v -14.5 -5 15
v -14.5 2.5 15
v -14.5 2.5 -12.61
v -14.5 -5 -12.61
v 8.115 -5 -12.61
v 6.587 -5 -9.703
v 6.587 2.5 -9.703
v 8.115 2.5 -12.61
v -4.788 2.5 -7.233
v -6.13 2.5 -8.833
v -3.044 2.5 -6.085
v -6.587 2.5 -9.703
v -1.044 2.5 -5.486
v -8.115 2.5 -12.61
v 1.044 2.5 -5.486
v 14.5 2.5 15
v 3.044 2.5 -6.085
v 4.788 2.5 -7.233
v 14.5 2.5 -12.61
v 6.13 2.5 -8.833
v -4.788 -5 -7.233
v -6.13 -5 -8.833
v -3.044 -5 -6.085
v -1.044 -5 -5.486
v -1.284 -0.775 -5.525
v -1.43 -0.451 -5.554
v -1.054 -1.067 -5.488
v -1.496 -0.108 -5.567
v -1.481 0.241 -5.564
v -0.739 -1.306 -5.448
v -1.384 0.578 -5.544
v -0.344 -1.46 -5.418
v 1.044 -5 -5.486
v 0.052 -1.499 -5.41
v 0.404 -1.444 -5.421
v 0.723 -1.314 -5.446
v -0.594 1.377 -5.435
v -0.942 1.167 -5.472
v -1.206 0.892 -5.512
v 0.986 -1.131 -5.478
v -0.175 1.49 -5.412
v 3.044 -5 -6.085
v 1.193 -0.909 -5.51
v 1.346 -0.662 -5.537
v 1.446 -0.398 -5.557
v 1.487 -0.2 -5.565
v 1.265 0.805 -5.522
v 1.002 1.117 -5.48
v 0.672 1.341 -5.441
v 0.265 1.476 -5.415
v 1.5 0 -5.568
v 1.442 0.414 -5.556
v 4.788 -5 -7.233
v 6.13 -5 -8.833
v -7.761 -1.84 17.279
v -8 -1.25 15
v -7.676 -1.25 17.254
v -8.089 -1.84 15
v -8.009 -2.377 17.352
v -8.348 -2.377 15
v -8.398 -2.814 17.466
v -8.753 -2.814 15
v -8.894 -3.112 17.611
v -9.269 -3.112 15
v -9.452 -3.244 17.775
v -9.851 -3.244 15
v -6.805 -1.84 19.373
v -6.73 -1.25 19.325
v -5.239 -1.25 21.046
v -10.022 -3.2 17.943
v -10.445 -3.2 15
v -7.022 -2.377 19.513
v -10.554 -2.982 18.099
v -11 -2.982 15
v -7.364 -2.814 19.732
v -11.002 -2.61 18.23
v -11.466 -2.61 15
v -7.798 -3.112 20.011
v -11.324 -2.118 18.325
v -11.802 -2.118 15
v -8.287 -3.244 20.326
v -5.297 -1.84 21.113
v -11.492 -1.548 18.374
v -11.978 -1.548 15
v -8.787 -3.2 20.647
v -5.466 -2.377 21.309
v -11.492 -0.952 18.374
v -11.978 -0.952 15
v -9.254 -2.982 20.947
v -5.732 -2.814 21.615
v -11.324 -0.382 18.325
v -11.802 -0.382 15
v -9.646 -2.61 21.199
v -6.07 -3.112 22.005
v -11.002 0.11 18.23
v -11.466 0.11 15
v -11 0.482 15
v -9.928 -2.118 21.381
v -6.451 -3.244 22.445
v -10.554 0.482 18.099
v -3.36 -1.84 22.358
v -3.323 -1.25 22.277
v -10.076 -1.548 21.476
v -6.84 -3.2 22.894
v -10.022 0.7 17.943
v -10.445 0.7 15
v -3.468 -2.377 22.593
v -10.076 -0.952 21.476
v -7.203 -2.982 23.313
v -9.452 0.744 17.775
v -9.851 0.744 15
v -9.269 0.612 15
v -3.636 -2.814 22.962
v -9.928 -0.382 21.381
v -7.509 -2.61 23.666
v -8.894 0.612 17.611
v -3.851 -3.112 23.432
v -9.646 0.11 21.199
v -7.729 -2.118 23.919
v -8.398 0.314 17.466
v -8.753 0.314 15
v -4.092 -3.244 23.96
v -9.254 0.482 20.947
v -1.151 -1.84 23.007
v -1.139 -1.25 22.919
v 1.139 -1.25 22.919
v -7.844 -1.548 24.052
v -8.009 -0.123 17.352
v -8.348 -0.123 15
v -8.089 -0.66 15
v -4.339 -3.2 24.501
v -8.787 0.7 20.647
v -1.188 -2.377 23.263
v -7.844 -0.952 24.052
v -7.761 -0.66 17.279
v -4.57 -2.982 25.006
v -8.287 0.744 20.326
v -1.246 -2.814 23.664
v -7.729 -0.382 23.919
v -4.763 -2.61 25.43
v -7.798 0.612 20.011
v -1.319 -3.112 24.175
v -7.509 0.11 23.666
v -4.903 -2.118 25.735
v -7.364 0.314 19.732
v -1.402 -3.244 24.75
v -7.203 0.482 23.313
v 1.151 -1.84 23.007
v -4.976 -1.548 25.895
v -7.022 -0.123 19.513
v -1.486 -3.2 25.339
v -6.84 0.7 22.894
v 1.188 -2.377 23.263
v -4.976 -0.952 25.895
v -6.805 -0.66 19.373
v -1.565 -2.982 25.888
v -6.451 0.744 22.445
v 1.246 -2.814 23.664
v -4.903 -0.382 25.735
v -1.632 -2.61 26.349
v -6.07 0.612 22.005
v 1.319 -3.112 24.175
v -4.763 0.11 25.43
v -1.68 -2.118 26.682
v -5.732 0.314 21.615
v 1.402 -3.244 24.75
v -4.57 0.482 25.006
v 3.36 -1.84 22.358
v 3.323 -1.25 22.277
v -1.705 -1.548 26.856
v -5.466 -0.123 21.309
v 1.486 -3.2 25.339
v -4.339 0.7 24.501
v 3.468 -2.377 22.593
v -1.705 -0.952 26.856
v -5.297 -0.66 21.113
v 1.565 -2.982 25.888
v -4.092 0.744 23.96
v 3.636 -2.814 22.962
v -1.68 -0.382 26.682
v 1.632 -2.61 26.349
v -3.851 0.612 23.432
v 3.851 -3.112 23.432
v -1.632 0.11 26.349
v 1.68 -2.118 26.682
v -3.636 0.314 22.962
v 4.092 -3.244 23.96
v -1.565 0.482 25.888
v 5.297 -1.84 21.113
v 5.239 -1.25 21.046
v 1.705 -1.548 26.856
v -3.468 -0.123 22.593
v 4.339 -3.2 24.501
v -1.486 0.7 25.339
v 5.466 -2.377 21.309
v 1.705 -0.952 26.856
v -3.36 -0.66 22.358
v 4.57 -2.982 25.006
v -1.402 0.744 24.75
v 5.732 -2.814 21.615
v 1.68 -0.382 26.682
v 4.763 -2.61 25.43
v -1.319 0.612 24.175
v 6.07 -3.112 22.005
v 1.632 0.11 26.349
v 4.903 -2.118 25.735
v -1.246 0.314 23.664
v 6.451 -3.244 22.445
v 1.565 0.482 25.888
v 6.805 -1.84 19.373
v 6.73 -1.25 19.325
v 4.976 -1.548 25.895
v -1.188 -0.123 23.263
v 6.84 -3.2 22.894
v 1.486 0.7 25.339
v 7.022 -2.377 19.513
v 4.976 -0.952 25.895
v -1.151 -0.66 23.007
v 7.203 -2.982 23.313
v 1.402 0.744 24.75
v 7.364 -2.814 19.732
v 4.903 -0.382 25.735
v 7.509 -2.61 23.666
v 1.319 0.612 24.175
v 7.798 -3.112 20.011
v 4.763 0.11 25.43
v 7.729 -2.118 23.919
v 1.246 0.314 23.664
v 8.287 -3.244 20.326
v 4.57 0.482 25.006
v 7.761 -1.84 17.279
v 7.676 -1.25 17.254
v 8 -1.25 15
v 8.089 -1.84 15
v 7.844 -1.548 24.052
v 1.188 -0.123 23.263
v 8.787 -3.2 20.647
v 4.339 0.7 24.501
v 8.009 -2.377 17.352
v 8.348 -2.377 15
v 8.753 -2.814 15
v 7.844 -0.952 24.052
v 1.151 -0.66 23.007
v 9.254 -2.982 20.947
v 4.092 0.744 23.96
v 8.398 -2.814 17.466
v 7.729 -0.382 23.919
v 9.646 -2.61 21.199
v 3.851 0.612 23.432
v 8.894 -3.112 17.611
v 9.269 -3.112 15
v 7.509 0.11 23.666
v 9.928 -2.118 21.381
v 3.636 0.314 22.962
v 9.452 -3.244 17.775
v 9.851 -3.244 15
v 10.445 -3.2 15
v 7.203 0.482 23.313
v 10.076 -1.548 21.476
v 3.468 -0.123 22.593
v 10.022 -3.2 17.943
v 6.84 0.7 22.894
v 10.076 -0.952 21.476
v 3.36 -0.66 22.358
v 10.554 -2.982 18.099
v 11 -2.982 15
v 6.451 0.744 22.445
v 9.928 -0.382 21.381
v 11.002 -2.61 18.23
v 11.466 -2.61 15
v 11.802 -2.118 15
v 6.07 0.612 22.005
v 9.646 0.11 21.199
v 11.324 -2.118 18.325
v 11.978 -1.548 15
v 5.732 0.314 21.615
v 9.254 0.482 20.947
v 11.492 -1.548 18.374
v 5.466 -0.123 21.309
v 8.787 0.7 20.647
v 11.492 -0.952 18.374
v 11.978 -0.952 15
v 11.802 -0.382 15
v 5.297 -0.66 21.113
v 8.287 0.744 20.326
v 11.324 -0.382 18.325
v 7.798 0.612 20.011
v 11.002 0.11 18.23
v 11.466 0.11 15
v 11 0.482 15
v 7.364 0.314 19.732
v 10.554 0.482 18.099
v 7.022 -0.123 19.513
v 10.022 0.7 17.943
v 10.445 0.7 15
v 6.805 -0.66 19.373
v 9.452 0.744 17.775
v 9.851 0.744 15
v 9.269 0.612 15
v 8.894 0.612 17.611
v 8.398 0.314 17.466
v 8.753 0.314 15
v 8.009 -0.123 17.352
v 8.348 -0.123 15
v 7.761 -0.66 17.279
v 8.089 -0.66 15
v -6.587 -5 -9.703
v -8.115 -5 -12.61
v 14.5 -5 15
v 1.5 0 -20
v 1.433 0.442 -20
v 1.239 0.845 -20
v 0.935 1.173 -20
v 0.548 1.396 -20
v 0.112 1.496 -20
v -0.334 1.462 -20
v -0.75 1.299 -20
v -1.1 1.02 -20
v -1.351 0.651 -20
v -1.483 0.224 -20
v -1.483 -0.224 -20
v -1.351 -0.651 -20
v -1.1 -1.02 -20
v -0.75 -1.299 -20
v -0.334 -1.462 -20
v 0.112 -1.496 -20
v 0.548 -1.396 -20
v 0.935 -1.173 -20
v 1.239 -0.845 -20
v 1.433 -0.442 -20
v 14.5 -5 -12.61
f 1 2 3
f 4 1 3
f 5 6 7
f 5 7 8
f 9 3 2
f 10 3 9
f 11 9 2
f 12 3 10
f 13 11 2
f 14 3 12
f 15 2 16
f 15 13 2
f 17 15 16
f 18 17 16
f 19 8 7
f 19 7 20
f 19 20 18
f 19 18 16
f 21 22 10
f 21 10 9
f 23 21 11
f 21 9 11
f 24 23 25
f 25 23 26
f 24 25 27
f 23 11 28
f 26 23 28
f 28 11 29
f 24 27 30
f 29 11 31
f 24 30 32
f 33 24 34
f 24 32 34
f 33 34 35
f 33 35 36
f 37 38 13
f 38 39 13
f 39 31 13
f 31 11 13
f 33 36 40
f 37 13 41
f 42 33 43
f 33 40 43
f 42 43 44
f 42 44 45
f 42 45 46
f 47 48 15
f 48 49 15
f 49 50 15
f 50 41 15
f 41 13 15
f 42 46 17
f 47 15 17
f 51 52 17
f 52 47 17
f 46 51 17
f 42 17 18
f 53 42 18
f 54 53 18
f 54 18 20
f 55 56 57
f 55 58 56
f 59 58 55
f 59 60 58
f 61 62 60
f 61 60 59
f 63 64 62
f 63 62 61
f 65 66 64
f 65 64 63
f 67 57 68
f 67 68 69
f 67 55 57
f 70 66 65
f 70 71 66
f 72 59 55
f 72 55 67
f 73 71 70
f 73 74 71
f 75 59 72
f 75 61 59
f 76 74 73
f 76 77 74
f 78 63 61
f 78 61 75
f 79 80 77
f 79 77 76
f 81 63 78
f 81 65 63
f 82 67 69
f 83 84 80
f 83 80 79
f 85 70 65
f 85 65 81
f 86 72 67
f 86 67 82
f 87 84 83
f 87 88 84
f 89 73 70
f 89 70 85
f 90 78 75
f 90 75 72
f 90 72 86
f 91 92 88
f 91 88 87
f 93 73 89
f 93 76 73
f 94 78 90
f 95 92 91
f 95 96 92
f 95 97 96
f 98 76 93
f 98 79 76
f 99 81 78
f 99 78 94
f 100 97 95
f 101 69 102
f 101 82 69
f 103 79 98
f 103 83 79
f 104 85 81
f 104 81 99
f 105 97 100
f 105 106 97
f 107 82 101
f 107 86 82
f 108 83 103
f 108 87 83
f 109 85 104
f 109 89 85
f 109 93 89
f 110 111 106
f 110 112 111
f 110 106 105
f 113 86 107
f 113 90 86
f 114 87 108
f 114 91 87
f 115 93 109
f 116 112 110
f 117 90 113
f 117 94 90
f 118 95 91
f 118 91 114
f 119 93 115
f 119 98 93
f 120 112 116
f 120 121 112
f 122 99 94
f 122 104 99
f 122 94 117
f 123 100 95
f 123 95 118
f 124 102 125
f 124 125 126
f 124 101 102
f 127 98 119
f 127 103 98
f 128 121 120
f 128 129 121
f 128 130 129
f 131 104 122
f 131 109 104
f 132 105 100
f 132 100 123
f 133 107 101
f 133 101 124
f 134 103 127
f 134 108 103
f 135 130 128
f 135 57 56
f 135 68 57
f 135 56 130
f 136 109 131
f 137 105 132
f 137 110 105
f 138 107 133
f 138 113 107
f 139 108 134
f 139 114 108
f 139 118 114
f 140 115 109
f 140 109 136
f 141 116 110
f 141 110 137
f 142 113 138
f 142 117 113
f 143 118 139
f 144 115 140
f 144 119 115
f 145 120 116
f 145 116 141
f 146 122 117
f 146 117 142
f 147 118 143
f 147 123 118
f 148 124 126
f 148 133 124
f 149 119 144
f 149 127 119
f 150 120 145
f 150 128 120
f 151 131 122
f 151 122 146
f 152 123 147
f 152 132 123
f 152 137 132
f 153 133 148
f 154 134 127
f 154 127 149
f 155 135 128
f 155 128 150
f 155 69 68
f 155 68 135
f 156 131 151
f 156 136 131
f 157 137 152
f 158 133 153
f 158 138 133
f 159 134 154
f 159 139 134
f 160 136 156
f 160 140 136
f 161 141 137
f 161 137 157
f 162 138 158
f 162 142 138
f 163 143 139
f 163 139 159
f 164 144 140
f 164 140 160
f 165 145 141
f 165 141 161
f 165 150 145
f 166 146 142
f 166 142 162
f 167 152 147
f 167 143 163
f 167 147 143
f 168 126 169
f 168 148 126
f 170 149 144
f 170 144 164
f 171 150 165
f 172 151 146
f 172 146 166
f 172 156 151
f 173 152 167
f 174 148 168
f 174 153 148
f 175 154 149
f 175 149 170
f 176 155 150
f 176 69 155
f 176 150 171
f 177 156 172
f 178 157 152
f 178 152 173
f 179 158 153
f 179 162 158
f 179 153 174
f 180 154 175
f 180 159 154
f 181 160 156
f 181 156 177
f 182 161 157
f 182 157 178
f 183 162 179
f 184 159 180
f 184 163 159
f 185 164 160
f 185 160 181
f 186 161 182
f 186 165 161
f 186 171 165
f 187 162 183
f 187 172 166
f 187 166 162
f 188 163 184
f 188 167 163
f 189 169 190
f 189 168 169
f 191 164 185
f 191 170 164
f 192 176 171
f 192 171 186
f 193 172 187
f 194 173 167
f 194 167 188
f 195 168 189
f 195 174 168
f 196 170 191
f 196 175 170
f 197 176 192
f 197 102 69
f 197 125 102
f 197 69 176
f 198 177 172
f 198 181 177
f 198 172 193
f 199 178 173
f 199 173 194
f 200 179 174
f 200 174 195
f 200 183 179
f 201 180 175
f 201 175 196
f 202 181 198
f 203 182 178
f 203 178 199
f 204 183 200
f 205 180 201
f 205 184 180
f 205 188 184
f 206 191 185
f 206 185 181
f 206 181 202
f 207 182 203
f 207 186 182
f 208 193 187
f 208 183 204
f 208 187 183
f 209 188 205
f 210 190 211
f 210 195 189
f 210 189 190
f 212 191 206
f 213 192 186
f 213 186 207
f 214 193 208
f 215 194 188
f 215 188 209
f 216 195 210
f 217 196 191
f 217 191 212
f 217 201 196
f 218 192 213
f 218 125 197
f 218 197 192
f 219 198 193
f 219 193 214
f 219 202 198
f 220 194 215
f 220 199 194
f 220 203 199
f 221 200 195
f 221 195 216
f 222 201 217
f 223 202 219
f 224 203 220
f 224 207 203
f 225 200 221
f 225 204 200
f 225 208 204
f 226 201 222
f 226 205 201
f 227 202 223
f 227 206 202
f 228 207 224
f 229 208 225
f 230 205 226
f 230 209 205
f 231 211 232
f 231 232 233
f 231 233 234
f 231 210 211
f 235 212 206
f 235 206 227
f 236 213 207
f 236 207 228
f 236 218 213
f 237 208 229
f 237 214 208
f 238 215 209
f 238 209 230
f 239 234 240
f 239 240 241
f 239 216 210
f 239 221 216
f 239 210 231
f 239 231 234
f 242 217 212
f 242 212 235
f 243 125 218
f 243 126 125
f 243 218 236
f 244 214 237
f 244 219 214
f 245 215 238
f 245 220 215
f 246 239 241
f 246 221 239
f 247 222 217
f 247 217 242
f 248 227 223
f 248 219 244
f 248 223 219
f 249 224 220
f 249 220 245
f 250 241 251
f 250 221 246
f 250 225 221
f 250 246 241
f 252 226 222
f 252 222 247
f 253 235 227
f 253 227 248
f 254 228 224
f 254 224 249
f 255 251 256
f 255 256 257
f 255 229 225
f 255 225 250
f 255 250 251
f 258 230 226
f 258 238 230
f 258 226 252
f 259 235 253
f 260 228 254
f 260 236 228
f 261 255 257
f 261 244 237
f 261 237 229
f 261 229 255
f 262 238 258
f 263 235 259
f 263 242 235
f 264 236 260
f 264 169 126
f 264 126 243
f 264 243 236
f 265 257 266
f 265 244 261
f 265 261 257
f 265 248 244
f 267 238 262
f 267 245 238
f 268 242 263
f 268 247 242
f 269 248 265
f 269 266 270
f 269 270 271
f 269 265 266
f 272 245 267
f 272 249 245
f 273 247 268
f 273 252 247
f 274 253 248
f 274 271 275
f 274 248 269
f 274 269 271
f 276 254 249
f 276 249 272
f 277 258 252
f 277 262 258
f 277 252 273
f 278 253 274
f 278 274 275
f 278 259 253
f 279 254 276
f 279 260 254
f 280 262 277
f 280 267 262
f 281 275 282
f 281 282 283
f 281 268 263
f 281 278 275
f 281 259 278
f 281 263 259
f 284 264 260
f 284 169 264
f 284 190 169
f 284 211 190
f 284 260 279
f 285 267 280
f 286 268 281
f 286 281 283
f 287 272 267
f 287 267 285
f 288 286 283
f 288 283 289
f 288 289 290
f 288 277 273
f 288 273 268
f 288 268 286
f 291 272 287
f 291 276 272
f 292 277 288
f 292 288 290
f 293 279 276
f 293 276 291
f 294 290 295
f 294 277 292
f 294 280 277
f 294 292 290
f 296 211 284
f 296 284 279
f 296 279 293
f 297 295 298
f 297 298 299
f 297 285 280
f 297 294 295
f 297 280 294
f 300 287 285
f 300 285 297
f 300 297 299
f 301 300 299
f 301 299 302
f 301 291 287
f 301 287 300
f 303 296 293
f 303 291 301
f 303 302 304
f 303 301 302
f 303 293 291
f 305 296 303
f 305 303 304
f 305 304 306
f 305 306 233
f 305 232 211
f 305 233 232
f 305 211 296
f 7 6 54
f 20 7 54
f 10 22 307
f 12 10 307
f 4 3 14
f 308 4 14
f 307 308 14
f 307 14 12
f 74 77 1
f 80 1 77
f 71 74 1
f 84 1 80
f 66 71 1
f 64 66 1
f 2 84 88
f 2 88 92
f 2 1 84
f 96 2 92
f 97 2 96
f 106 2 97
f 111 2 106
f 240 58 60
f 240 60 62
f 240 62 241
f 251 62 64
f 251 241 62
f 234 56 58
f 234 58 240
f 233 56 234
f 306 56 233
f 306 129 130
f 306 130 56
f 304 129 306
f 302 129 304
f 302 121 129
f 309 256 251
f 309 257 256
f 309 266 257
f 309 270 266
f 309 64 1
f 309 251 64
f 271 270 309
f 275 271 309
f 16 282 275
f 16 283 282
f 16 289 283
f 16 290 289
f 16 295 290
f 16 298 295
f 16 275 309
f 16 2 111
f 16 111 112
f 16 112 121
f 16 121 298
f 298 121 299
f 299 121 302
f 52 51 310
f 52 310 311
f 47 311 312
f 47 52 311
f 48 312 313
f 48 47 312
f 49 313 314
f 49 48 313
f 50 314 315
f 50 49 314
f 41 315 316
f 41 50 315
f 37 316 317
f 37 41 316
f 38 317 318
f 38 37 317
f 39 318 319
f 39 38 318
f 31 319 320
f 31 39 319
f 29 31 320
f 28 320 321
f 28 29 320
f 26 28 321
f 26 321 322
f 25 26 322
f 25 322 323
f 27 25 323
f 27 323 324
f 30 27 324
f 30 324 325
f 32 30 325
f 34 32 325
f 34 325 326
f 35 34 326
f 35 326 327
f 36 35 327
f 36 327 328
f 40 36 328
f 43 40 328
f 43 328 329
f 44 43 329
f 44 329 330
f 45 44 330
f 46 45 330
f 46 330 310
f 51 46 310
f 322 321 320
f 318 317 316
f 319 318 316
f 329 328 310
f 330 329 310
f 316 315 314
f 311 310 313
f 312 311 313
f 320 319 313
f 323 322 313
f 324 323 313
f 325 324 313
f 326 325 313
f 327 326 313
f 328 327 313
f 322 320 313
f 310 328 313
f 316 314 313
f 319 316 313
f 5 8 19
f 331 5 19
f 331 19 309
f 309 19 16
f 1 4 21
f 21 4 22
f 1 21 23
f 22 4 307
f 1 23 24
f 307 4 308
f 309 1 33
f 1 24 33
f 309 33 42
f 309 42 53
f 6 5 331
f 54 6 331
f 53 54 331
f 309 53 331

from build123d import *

# Parameters (mm, degrees)
SKETCH1_R           = 1.5
BOSS_EXTRUDE1_DEPTH = 20
BOSS_EXTRUDE2_START = 15
BOSS_EXTRUDE2_DEPTH = 15
SWEEP1_PROFILE_R    = 2
BOSS_EXTRUDE3_DEPTH = 7.5
CHAMFER1_START      = -6
CHAMFER1_DEPTH      = 9
CHAMFER1_START_2    = -5
CHAMFER1_2_DEPTH    = 7.5


with BuildPart() as part:
    # Sketch1 → Boss-Extrude1 (new body)
    with BuildSketch(Plane.XY):
        Circle(SKETCH1_R)
    extrude(amount=-BOSS_EXTRUDE1_DEPTH)

    # Sketch1<3> → Boss-Extrude2 (add)
    with BuildSketch(Plane.XY.offset(BOSS_EXTRUDE2_START)):
        with BuildLine():
            Line((0, 1.5), (0, 2.5))
            Line((0, 2.5), (-14.5, 2.5))
            Line((-14.5, 2.5), (-14.5, -5))
            Line((-14.5, -5), (0, -5))
            Line((0, -5), (0, -1.5))
            ThreePointArc((0, -1.5), (-1.5, 0), (0, 1.5))
        make_face()
        with BuildLine():
            ThreePointArc((1.5, 0), (1.060660172, 1.060660172), (0, 1.5))
            Line((0, 1.5), (0, -1.5))
            ThreePointArc((0, -1.5), (1.060660172, -1.060660172), (1.5, 0))
        make_face()
        with BuildLine():
            Line((0, -1.5), (0, 1.5))
            ThreePointArc((0, 1.5), (-1.5, 0), (0, -1.5))
        make_face()
        with BuildLine():
            Line((14.5, 2.5), (0, 2.5))
            Line((0, 2.5), (0, 1.5))
            ThreePointArc((0, 1.5), (1.060660172, 1.060660172), (1.5, 0))
            ThreePointArc((1.5, 0), (1.060660172, -1.060660172), (0, -1.5))
            Line((0, -1.5), (0, -5))
            Line((0, -5), (14.5, -5))
            Line((14.5, -5), (14.5, 2.5))
        make_face()
    extrude(amount=-BOSS_EXTRUDE2_DEPTH)

    # Sweep1: sweep along a path in Sketch2
    with BuildLine(Plane(origin=(0, -1.25, 0), x_dir=(1, 0, 0), z_dir=(0, 1, 0))) as sweep1_path:
        ThreePointArc((-10, -15), (0, -25), (10, -15))
    # Sweep1 profile (on start of the path) → Sweep1 (sweep)
    with BuildSketch(Plane(origin=(-10, -1.25, 15), x_dir=(1, 0, 0), z_dir=(0, 0, 1))):
        Circle(SWEEP1_PROFILE_R)
    sweep(path=sweep1_path.line)

    # Sketch15 → Boss-Extrude3 (add)
    with BuildSketch(Plane(origin=(0, 2.5, 0), x_dir=(1, 0, 0), z_dir=(0, 1, 0))):
        with BuildLine():
            ThreePointArc((-7.2, 12.61), (0, 5.41), (7.2, 12.61))
            Line((7.2, 12.61), (14.5, 12.61))
            Line((14.5, 12.61), (14.5, 0))
            Line((14.5, 0), (-14.5, 0))
            Line((-14.5, 0), (-14.5, 12.61))
            Line((-14.5, 12.61), (-7.2, 12.61))
        make_face()
    extrude(amount=-BOSS_EXTRUDE3_DEPTH)

    # Chamfer1: read off the stored shape, not the designer's step
    # Chamfer1 outline → Chamfer1 (cut)
    with BuildSketch(Plane(origin=(0, 0, 0), x_dir=(1, 0, 0), z_dir=(0, 1, 0)).offset(CHAMFER1_START)):
        with BuildLine():
            ThreePointArc((7.2, 12.61), (7.04514475, 11.12476081), (6.587240153, 9.7034097))
            Line((6.587240153, 9.7034097), (8.114814982, 12.61))
            Line((8.114814982, 12.61), (7.2, 12.61))
        make_face()
        with BuildLine():
            Line((-8.114814982, 12.61), (-6.587240153, 9.7034097))
            ThreePointArc((-6.587240153, 9.7034097), (-7.04514475, 11.12476081), (-7.2, 12.61))
            Line((-7.2, 12.61), (-8.114814982, 12.61))
        make_face()
    extrude(amount=CHAMFER1_DEPTH, mode=Mode.SUBTRACT)

    # Chamfer1 2 outline → Chamfer1 2 (add)
    with BuildSketch(Plane(origin=(0, 0, 0), x_dir=(1, 0, 0), z_dir=(0, 1, 0)).offset(CHAMFER1_START_2)):
        with BuildLine():
            ThreePointArc((-6.587240153, 9.7034097), (-6.373406906, 9.260420263), (-6.129825647, 8.83306506))
            Line((-6.129825647, 8.83306506), (-6.587240153, 9.7034097))
        make_face()
        with BuildLine():
            Line((6.587240153, 9.7034097), (6.129825647, 8.83306506))
            ThreePointArc((6.129825647, 8.83306506), (6.373406906, 9.260420263), (6.587240153, 9.7034097))
        make_face()
    extrude(amount=CHAMFER1_2_DEPTH)


solid = part.part
